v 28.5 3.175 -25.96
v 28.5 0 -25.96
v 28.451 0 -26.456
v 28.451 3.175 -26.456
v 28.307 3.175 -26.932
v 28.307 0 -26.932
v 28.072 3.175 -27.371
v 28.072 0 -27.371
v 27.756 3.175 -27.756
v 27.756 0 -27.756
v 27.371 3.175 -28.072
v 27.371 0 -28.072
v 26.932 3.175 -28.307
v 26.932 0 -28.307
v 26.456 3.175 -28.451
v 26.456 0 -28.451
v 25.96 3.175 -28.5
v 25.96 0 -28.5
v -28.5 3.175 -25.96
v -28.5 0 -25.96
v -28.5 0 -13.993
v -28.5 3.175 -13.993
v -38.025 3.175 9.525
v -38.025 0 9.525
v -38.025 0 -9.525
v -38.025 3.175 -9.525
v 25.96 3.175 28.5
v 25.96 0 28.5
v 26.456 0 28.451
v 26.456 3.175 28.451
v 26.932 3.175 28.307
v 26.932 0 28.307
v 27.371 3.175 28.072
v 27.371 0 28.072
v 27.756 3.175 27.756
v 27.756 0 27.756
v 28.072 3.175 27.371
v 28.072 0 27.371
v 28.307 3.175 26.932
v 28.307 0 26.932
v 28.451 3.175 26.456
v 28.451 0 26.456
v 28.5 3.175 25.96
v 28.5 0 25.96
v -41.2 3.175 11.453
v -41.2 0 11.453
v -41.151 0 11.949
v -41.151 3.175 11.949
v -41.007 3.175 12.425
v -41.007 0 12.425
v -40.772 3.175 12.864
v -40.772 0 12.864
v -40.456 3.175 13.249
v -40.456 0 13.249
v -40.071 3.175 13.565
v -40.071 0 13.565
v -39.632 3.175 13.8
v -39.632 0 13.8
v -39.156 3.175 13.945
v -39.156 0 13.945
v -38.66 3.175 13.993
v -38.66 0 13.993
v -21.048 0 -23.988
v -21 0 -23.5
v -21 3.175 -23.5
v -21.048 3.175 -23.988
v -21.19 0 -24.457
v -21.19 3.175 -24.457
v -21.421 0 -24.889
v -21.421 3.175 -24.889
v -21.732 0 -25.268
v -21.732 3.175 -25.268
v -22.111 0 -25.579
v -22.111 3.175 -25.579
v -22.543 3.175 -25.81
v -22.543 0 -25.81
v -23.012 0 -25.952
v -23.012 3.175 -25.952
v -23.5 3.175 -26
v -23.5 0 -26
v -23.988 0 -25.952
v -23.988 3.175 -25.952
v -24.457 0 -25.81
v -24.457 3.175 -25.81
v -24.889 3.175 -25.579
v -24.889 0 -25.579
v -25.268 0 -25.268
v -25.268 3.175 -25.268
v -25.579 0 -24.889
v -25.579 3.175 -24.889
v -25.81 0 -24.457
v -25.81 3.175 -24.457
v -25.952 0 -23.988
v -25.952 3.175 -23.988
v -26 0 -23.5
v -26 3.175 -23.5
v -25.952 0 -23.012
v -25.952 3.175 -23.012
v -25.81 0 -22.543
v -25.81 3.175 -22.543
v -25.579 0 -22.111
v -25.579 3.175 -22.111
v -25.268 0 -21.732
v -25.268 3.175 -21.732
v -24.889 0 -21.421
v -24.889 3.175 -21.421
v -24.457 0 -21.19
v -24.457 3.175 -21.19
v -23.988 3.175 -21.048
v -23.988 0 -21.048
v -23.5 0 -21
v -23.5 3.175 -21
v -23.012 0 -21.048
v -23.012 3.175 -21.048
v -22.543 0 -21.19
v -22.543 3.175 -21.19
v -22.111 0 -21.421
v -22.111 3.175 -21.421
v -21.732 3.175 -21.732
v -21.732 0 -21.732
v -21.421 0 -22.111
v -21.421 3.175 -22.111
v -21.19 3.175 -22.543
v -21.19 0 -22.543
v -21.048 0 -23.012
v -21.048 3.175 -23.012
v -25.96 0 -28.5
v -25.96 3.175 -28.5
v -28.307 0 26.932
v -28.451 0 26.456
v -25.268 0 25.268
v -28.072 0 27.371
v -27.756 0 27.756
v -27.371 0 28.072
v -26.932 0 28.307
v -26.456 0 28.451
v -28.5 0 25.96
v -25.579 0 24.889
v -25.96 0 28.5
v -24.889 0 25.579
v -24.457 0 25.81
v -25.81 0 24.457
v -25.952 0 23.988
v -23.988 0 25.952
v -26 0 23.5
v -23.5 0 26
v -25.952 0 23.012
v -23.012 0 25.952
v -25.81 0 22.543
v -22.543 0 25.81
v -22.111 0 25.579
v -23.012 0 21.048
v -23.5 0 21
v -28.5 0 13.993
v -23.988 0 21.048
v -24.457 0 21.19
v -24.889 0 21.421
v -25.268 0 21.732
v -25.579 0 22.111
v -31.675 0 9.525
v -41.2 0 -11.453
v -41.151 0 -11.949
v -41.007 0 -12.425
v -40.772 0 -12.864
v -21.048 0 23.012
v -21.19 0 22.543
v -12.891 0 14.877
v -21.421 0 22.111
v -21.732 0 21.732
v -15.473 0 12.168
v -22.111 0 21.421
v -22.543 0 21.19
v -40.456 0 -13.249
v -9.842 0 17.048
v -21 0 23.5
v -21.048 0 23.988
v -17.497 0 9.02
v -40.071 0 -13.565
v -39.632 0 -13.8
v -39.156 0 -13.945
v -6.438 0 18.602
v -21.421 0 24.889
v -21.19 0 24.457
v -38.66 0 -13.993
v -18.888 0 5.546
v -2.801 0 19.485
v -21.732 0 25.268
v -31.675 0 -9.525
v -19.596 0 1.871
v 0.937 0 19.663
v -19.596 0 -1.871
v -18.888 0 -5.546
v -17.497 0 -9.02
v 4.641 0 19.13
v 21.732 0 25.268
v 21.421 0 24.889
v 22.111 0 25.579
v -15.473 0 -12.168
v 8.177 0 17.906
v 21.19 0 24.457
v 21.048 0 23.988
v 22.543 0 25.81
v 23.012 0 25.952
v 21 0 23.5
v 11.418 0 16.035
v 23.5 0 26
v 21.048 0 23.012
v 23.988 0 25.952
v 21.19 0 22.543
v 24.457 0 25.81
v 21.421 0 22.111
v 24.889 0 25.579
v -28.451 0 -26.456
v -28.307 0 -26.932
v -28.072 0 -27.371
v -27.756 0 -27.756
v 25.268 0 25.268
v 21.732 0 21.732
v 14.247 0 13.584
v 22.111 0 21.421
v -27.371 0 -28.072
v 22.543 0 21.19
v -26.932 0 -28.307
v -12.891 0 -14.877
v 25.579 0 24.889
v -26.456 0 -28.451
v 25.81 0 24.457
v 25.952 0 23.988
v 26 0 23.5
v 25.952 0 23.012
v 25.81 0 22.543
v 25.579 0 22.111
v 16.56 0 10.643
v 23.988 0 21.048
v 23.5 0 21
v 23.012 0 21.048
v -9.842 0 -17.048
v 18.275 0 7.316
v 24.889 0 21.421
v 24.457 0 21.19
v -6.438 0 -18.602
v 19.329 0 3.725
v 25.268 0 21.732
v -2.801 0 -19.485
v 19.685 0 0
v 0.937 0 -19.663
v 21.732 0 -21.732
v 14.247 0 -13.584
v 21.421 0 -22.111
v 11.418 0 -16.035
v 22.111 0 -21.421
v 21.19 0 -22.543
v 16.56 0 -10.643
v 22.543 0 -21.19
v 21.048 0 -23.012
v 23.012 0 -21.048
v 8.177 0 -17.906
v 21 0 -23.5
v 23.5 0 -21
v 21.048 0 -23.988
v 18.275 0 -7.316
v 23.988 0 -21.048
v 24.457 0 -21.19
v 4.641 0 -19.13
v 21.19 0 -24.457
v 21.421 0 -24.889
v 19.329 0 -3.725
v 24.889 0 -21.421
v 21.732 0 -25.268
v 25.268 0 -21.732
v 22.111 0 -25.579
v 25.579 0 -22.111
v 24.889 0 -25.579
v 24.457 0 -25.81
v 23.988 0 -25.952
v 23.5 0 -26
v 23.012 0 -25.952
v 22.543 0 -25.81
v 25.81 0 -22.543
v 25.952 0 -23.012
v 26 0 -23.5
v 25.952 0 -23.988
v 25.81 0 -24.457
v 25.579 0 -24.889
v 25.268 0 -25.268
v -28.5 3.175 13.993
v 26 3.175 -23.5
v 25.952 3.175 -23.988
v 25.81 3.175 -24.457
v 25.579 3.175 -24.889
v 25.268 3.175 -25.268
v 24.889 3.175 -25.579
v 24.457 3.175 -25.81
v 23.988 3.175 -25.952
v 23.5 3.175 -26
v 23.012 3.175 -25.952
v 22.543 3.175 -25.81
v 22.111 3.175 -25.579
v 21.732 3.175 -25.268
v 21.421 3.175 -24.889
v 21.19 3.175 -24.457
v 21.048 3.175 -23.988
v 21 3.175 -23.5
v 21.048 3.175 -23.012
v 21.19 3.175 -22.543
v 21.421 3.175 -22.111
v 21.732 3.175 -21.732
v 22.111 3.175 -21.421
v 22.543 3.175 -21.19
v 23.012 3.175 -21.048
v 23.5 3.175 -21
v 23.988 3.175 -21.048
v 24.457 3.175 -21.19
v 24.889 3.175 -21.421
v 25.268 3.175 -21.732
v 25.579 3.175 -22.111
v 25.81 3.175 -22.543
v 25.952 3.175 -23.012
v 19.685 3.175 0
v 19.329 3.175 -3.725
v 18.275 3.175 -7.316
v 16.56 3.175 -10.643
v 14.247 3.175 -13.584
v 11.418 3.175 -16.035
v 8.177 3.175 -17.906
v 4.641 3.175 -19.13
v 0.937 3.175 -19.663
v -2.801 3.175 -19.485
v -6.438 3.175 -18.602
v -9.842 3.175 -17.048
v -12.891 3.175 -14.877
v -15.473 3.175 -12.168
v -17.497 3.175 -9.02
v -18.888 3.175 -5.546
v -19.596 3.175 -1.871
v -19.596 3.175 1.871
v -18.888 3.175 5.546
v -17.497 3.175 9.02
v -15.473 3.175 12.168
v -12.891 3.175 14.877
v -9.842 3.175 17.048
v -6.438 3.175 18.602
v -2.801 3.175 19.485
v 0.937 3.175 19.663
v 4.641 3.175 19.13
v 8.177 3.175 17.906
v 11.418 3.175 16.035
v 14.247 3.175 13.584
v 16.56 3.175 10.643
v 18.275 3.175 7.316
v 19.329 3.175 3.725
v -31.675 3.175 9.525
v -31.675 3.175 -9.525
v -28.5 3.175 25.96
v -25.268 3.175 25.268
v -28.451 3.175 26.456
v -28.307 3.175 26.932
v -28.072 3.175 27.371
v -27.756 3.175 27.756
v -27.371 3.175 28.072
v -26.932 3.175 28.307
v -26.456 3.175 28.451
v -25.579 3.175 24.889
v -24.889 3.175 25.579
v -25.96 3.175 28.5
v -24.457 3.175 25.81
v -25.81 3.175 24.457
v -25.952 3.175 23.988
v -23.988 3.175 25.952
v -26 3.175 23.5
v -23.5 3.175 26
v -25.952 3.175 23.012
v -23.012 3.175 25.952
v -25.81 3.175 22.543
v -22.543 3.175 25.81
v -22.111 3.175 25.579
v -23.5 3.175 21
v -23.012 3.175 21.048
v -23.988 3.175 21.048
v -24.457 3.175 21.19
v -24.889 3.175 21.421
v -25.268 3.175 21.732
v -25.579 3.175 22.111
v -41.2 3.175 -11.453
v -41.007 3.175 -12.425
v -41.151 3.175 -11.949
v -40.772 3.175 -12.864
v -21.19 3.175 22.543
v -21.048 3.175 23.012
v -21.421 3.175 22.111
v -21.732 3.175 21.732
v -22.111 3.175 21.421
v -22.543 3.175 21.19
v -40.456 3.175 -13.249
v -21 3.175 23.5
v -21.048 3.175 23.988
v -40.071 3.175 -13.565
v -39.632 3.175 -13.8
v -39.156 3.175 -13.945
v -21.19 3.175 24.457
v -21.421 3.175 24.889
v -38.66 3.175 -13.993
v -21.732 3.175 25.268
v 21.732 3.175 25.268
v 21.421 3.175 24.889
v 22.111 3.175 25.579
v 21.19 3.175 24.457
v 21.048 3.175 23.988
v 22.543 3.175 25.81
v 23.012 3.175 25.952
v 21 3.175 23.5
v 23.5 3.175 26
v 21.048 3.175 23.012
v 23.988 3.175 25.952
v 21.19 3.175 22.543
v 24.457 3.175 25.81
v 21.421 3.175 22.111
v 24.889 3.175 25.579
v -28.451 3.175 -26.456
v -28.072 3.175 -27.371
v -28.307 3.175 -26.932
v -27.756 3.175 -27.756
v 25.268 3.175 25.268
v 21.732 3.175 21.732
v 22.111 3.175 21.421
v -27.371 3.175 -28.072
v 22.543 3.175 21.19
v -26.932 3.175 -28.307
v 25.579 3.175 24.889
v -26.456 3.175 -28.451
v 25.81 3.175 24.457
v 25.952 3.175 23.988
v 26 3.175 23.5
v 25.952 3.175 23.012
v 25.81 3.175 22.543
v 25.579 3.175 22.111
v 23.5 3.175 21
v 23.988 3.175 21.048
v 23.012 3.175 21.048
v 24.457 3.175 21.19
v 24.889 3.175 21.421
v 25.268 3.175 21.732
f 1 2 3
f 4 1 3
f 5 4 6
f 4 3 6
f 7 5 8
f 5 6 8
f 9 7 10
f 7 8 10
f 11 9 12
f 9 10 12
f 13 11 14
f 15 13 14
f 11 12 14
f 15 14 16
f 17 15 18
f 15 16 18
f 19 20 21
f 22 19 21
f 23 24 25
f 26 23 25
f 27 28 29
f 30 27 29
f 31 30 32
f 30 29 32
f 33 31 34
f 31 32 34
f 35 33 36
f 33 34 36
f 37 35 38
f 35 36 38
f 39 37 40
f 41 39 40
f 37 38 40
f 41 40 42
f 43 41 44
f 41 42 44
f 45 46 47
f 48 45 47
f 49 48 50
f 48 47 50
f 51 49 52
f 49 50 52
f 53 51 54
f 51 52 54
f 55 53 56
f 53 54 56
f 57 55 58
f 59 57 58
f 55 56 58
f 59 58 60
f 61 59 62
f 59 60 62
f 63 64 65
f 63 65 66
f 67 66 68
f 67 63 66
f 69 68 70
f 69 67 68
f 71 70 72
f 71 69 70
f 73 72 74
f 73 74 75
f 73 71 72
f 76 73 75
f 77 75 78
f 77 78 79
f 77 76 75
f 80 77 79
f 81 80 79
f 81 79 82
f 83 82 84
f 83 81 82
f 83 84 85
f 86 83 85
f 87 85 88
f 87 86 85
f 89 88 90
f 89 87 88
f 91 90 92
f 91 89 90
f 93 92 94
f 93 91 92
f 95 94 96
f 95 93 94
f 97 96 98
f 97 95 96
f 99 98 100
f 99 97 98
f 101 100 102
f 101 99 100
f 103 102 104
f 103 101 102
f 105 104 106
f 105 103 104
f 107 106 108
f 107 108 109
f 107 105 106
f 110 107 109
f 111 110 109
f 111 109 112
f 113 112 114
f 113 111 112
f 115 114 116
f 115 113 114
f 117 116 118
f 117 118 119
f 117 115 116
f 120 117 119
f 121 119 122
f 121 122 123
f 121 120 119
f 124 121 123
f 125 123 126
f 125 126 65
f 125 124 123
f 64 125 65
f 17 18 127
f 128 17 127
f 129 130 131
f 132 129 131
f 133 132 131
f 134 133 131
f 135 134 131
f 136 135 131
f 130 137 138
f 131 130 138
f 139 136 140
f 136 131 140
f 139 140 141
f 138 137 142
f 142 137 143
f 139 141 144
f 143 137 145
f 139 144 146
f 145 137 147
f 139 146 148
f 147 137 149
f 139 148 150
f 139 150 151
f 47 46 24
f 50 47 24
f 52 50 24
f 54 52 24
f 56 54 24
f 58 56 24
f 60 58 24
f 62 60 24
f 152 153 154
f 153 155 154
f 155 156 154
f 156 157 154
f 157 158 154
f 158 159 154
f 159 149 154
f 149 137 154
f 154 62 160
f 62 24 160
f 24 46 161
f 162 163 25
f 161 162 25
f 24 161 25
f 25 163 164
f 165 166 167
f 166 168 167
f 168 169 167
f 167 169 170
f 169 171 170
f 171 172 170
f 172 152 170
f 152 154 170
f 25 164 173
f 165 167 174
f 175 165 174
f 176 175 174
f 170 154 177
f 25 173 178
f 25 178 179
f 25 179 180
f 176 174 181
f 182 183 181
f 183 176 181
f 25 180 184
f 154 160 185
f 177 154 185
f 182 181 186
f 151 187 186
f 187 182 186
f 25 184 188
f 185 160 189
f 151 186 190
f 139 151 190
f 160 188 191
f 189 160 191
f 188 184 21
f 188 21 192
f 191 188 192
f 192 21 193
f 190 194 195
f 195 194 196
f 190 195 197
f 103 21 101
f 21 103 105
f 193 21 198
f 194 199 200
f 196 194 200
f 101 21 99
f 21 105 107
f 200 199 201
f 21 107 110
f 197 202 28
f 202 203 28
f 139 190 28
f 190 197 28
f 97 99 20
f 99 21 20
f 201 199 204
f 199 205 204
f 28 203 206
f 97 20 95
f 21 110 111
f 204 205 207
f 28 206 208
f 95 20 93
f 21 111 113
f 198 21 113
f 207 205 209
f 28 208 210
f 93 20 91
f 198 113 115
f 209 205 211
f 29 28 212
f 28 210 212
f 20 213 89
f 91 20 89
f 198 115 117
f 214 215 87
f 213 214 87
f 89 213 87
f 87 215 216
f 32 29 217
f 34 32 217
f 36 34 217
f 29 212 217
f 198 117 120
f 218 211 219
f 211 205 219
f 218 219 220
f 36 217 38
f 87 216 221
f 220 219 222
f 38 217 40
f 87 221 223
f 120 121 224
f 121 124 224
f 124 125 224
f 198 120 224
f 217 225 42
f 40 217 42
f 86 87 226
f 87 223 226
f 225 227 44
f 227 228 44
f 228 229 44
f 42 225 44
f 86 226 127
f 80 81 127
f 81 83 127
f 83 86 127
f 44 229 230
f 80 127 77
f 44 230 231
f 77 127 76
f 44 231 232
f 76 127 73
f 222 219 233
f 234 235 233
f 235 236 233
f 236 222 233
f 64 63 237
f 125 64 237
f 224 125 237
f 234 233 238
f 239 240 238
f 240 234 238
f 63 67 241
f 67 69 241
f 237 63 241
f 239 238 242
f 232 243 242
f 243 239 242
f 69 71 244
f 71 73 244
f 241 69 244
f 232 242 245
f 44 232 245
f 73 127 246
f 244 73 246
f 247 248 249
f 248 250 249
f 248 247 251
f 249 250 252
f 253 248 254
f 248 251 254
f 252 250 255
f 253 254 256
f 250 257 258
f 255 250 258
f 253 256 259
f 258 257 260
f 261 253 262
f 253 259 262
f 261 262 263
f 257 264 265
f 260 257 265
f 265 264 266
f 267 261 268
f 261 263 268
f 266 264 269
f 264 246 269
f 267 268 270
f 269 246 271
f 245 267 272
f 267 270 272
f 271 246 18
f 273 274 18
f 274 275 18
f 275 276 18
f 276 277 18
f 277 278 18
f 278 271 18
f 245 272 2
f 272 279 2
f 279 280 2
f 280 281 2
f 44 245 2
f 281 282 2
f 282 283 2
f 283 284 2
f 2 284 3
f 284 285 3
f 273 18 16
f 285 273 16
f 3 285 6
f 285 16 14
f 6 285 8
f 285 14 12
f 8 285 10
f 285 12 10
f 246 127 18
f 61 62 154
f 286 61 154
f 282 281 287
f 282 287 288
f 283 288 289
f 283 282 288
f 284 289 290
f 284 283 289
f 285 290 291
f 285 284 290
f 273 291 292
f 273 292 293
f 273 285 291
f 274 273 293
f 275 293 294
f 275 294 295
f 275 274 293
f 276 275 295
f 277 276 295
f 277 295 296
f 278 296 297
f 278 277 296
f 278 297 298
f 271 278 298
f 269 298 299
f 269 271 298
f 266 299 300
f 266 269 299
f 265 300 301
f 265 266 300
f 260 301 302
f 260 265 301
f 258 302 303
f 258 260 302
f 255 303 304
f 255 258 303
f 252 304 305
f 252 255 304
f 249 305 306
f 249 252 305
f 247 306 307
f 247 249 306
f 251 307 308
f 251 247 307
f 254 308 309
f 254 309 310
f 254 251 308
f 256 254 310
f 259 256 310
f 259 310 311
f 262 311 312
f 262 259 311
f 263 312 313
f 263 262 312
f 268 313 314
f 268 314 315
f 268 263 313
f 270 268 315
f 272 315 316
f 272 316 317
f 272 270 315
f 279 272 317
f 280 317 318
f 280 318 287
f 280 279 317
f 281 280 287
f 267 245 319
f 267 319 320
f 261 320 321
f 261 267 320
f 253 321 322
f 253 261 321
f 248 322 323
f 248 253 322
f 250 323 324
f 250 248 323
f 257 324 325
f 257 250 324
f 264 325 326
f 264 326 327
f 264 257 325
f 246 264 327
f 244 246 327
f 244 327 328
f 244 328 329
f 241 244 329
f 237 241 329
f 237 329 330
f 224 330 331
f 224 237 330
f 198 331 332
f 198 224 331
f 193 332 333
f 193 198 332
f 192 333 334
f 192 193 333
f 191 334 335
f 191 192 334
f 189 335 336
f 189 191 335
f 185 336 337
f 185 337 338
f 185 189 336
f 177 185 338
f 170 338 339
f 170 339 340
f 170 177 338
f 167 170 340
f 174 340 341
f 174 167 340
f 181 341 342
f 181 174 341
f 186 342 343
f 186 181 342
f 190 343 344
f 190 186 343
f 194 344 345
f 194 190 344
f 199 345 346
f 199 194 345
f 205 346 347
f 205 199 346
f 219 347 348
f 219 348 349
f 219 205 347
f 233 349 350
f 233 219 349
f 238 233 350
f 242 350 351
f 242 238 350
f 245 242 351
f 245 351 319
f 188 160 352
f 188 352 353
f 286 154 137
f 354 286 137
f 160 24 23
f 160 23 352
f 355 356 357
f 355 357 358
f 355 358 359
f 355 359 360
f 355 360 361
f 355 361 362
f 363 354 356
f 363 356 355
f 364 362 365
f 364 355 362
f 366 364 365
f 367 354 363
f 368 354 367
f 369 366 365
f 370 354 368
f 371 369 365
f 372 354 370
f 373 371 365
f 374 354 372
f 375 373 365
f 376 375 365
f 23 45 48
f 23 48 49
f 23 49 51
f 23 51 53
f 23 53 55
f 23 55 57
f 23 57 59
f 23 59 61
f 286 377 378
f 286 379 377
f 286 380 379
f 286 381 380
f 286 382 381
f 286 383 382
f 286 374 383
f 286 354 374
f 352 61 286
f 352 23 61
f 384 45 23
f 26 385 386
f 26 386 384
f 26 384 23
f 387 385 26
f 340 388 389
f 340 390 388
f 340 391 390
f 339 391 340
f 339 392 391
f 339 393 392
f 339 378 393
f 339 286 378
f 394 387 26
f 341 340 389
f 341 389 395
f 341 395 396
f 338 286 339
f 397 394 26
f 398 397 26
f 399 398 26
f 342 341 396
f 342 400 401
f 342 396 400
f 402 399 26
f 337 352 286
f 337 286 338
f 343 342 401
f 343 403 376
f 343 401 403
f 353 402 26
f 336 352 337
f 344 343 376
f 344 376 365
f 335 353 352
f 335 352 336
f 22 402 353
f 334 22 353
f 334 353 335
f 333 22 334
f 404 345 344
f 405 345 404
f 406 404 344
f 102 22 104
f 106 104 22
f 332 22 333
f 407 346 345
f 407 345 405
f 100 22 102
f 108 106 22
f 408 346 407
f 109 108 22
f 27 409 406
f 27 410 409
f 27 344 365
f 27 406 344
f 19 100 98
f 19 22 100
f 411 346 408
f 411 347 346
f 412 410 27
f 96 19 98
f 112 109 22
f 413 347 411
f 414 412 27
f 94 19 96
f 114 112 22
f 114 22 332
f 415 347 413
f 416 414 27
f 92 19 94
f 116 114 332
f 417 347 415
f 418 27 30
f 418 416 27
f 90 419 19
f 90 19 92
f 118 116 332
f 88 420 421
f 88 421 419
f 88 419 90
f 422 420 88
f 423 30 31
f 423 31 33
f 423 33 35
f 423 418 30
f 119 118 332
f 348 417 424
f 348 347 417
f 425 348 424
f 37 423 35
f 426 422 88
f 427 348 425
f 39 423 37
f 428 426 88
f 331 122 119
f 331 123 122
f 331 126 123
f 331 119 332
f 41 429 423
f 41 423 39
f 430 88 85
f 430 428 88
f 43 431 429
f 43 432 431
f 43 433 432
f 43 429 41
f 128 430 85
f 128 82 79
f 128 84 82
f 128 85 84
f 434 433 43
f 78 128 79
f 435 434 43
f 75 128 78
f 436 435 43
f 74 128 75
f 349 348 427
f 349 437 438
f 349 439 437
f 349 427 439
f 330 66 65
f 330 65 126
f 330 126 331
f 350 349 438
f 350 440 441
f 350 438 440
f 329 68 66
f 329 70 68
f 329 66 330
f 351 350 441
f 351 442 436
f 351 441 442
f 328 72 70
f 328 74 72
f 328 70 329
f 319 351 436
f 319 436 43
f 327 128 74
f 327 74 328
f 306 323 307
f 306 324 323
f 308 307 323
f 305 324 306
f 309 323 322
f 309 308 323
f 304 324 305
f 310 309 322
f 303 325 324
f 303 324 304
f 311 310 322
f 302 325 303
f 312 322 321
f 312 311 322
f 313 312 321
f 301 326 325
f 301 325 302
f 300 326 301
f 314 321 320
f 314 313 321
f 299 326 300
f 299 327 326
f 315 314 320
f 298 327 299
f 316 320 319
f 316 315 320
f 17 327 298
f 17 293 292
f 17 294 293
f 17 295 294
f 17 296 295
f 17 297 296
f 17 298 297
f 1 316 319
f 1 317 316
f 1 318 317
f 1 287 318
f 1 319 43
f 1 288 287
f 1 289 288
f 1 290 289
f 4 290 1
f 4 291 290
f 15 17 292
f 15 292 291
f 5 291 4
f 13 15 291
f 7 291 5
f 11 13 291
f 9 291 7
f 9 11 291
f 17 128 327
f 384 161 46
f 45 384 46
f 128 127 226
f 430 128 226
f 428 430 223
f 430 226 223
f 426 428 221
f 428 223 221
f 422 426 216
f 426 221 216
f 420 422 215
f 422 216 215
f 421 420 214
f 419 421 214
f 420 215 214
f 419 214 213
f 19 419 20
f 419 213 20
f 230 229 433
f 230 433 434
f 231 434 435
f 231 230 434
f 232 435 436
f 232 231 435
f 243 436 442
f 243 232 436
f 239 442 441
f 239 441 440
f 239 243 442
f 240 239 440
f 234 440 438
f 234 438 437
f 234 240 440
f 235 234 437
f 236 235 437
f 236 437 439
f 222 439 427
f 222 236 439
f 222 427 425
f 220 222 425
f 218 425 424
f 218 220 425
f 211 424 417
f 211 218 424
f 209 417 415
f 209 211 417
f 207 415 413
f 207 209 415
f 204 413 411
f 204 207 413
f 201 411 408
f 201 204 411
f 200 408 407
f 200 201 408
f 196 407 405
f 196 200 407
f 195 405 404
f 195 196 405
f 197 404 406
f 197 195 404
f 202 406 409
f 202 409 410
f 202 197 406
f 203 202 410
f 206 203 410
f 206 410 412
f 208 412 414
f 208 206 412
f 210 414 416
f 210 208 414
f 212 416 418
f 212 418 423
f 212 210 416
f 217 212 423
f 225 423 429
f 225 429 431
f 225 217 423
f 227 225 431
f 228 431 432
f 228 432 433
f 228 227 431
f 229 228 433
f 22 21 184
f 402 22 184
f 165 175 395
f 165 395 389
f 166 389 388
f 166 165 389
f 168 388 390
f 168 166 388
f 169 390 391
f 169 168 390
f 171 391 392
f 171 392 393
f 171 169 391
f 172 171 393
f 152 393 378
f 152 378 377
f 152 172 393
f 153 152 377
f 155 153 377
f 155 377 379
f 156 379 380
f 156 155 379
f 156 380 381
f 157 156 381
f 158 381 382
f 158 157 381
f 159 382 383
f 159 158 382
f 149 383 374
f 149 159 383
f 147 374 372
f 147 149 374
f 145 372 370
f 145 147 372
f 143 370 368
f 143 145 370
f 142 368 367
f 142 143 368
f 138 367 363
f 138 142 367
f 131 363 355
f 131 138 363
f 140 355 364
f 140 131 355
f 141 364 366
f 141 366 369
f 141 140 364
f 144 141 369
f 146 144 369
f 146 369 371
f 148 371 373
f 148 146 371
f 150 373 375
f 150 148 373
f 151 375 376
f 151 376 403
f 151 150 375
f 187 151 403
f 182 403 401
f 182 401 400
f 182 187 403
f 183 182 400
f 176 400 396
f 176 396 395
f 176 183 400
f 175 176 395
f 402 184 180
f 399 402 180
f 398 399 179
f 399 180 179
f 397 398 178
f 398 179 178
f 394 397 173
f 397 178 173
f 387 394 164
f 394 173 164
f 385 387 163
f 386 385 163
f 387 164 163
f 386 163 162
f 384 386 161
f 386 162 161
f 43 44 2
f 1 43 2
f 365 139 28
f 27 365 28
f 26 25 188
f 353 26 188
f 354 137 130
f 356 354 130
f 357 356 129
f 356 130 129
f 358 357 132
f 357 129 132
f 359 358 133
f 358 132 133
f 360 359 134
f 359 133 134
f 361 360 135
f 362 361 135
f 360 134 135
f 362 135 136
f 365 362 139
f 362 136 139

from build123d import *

# Parameters (mm, degrees)
SKETCH1_R           = 19.685
SKETCH1_R_2         = 2.499995
SKETCH1_W           = 6.35
SKETCH1_H           = 19.05
BOSS_EXTRUDE1_DEPTH = 3.175


with BuildPart() as part:
    # Sketch1 → Boss-Extrude1 (new body)
    with BuildSketch(Plane(origin=(0, 0, 0), x_dir=(1, 0, 0), z_dir=(0, 1, 0))):
        with BuildLine():
            Line((-13.993314597, 28.4999938), (-25.9599938, 28.4999938))
            ThreePointArc((-25.9599938, 28.4999938), (-27.756045024, 27.756045024), (-28.4999938, 25.9599938))
            Line((-28.4999938, 25.9599938), (-28.4999938, 13.993314597))
            Line((-28.4999938, 13.993314597), (-38.6599938, 13.993314597))
            ThreePointArc((-38.6599938, 13.993314597), (-40.456045024, 13.249365821), (-41.1999938, 11.453314597))
            Line((-41.1999938, 11.453314597), (-41.1999938, -11.453314597))
            ThreePointArc((-41.1999938, -11.453314597), (-40.456045024, -13.249365821), (-38.6599938, -13.993314597))
            Line((-38.6599938, -13.993314597), (-28.4999938, -13.993314597))
            Line((-28.4999938, -13.993314597), (-28.4999938, -25.9599938))
            ThreePointArc((-28.4999938, -25.9599938), (-27.756045024, -27.756045024), (-25.9599938, -28.4999938))
            Line((-25.9599938, -28.4999938), (-13.993314597, -28.4999938))
            Line((-13.993314597, -28.4999938), (13.993314597, -28.4999938))
            Line((13.993314597, -28.4999938), (25.9599938, -28.4999938))
            ThreePointArc((25.9599938, -28.4999938), (27.756045024, -27.756045024), (28.4999938, -25.9599938))
            Line((28.4999938, -25.9599938), (28.4999938, -13.993314597))
            Line((28.4999938, -13.993314597), (28.4999938, 13.993314597))
            Line((28.4999938, 13.993314597), (28.4999938, 25.9599938))
            ThreePointArc((28.4999938, 25.9599938), (27.756045024, 27.756045024), (25.9599938, 28.4999938))
            Line((25.9599938, 28.4999938), (13.993314597, 28.4999938))
            Line((13.993314597, 28.4999938), (-13.993314597, 28.4999938))
        make_face()
        Circle(SKETCH1_R, mode=Mode.SUBTRACT)
        with Locations((-23.5000038, 23.5000038)):
            Circle(SKETCH1_R_2, mode=Mode.SUBTRACT)
        with Locations((23.5000038, 23.5000038)):
            Circle(SKETCH1_R_2, mode=Mode.SUBTRACT)
        with Locations((23.5000038, -23.5000038)):
            Circle(SKETCH1_R_2, mode=Mode.SUBTRACT)
        with Locations((-23.5000038, -23.5000038)):
            Circle(SKETCH1_R_2, mode=Mode.SUBTRACT)
        with Locations((-34.8499938, 0)):
            Rectangle(SKETCH1_W, SKETCH1_H, mode=Mode.SUBTRACT)
    extrude(amount=BOSS_EXTRUDE1_DEPTH)


solid = part.part
